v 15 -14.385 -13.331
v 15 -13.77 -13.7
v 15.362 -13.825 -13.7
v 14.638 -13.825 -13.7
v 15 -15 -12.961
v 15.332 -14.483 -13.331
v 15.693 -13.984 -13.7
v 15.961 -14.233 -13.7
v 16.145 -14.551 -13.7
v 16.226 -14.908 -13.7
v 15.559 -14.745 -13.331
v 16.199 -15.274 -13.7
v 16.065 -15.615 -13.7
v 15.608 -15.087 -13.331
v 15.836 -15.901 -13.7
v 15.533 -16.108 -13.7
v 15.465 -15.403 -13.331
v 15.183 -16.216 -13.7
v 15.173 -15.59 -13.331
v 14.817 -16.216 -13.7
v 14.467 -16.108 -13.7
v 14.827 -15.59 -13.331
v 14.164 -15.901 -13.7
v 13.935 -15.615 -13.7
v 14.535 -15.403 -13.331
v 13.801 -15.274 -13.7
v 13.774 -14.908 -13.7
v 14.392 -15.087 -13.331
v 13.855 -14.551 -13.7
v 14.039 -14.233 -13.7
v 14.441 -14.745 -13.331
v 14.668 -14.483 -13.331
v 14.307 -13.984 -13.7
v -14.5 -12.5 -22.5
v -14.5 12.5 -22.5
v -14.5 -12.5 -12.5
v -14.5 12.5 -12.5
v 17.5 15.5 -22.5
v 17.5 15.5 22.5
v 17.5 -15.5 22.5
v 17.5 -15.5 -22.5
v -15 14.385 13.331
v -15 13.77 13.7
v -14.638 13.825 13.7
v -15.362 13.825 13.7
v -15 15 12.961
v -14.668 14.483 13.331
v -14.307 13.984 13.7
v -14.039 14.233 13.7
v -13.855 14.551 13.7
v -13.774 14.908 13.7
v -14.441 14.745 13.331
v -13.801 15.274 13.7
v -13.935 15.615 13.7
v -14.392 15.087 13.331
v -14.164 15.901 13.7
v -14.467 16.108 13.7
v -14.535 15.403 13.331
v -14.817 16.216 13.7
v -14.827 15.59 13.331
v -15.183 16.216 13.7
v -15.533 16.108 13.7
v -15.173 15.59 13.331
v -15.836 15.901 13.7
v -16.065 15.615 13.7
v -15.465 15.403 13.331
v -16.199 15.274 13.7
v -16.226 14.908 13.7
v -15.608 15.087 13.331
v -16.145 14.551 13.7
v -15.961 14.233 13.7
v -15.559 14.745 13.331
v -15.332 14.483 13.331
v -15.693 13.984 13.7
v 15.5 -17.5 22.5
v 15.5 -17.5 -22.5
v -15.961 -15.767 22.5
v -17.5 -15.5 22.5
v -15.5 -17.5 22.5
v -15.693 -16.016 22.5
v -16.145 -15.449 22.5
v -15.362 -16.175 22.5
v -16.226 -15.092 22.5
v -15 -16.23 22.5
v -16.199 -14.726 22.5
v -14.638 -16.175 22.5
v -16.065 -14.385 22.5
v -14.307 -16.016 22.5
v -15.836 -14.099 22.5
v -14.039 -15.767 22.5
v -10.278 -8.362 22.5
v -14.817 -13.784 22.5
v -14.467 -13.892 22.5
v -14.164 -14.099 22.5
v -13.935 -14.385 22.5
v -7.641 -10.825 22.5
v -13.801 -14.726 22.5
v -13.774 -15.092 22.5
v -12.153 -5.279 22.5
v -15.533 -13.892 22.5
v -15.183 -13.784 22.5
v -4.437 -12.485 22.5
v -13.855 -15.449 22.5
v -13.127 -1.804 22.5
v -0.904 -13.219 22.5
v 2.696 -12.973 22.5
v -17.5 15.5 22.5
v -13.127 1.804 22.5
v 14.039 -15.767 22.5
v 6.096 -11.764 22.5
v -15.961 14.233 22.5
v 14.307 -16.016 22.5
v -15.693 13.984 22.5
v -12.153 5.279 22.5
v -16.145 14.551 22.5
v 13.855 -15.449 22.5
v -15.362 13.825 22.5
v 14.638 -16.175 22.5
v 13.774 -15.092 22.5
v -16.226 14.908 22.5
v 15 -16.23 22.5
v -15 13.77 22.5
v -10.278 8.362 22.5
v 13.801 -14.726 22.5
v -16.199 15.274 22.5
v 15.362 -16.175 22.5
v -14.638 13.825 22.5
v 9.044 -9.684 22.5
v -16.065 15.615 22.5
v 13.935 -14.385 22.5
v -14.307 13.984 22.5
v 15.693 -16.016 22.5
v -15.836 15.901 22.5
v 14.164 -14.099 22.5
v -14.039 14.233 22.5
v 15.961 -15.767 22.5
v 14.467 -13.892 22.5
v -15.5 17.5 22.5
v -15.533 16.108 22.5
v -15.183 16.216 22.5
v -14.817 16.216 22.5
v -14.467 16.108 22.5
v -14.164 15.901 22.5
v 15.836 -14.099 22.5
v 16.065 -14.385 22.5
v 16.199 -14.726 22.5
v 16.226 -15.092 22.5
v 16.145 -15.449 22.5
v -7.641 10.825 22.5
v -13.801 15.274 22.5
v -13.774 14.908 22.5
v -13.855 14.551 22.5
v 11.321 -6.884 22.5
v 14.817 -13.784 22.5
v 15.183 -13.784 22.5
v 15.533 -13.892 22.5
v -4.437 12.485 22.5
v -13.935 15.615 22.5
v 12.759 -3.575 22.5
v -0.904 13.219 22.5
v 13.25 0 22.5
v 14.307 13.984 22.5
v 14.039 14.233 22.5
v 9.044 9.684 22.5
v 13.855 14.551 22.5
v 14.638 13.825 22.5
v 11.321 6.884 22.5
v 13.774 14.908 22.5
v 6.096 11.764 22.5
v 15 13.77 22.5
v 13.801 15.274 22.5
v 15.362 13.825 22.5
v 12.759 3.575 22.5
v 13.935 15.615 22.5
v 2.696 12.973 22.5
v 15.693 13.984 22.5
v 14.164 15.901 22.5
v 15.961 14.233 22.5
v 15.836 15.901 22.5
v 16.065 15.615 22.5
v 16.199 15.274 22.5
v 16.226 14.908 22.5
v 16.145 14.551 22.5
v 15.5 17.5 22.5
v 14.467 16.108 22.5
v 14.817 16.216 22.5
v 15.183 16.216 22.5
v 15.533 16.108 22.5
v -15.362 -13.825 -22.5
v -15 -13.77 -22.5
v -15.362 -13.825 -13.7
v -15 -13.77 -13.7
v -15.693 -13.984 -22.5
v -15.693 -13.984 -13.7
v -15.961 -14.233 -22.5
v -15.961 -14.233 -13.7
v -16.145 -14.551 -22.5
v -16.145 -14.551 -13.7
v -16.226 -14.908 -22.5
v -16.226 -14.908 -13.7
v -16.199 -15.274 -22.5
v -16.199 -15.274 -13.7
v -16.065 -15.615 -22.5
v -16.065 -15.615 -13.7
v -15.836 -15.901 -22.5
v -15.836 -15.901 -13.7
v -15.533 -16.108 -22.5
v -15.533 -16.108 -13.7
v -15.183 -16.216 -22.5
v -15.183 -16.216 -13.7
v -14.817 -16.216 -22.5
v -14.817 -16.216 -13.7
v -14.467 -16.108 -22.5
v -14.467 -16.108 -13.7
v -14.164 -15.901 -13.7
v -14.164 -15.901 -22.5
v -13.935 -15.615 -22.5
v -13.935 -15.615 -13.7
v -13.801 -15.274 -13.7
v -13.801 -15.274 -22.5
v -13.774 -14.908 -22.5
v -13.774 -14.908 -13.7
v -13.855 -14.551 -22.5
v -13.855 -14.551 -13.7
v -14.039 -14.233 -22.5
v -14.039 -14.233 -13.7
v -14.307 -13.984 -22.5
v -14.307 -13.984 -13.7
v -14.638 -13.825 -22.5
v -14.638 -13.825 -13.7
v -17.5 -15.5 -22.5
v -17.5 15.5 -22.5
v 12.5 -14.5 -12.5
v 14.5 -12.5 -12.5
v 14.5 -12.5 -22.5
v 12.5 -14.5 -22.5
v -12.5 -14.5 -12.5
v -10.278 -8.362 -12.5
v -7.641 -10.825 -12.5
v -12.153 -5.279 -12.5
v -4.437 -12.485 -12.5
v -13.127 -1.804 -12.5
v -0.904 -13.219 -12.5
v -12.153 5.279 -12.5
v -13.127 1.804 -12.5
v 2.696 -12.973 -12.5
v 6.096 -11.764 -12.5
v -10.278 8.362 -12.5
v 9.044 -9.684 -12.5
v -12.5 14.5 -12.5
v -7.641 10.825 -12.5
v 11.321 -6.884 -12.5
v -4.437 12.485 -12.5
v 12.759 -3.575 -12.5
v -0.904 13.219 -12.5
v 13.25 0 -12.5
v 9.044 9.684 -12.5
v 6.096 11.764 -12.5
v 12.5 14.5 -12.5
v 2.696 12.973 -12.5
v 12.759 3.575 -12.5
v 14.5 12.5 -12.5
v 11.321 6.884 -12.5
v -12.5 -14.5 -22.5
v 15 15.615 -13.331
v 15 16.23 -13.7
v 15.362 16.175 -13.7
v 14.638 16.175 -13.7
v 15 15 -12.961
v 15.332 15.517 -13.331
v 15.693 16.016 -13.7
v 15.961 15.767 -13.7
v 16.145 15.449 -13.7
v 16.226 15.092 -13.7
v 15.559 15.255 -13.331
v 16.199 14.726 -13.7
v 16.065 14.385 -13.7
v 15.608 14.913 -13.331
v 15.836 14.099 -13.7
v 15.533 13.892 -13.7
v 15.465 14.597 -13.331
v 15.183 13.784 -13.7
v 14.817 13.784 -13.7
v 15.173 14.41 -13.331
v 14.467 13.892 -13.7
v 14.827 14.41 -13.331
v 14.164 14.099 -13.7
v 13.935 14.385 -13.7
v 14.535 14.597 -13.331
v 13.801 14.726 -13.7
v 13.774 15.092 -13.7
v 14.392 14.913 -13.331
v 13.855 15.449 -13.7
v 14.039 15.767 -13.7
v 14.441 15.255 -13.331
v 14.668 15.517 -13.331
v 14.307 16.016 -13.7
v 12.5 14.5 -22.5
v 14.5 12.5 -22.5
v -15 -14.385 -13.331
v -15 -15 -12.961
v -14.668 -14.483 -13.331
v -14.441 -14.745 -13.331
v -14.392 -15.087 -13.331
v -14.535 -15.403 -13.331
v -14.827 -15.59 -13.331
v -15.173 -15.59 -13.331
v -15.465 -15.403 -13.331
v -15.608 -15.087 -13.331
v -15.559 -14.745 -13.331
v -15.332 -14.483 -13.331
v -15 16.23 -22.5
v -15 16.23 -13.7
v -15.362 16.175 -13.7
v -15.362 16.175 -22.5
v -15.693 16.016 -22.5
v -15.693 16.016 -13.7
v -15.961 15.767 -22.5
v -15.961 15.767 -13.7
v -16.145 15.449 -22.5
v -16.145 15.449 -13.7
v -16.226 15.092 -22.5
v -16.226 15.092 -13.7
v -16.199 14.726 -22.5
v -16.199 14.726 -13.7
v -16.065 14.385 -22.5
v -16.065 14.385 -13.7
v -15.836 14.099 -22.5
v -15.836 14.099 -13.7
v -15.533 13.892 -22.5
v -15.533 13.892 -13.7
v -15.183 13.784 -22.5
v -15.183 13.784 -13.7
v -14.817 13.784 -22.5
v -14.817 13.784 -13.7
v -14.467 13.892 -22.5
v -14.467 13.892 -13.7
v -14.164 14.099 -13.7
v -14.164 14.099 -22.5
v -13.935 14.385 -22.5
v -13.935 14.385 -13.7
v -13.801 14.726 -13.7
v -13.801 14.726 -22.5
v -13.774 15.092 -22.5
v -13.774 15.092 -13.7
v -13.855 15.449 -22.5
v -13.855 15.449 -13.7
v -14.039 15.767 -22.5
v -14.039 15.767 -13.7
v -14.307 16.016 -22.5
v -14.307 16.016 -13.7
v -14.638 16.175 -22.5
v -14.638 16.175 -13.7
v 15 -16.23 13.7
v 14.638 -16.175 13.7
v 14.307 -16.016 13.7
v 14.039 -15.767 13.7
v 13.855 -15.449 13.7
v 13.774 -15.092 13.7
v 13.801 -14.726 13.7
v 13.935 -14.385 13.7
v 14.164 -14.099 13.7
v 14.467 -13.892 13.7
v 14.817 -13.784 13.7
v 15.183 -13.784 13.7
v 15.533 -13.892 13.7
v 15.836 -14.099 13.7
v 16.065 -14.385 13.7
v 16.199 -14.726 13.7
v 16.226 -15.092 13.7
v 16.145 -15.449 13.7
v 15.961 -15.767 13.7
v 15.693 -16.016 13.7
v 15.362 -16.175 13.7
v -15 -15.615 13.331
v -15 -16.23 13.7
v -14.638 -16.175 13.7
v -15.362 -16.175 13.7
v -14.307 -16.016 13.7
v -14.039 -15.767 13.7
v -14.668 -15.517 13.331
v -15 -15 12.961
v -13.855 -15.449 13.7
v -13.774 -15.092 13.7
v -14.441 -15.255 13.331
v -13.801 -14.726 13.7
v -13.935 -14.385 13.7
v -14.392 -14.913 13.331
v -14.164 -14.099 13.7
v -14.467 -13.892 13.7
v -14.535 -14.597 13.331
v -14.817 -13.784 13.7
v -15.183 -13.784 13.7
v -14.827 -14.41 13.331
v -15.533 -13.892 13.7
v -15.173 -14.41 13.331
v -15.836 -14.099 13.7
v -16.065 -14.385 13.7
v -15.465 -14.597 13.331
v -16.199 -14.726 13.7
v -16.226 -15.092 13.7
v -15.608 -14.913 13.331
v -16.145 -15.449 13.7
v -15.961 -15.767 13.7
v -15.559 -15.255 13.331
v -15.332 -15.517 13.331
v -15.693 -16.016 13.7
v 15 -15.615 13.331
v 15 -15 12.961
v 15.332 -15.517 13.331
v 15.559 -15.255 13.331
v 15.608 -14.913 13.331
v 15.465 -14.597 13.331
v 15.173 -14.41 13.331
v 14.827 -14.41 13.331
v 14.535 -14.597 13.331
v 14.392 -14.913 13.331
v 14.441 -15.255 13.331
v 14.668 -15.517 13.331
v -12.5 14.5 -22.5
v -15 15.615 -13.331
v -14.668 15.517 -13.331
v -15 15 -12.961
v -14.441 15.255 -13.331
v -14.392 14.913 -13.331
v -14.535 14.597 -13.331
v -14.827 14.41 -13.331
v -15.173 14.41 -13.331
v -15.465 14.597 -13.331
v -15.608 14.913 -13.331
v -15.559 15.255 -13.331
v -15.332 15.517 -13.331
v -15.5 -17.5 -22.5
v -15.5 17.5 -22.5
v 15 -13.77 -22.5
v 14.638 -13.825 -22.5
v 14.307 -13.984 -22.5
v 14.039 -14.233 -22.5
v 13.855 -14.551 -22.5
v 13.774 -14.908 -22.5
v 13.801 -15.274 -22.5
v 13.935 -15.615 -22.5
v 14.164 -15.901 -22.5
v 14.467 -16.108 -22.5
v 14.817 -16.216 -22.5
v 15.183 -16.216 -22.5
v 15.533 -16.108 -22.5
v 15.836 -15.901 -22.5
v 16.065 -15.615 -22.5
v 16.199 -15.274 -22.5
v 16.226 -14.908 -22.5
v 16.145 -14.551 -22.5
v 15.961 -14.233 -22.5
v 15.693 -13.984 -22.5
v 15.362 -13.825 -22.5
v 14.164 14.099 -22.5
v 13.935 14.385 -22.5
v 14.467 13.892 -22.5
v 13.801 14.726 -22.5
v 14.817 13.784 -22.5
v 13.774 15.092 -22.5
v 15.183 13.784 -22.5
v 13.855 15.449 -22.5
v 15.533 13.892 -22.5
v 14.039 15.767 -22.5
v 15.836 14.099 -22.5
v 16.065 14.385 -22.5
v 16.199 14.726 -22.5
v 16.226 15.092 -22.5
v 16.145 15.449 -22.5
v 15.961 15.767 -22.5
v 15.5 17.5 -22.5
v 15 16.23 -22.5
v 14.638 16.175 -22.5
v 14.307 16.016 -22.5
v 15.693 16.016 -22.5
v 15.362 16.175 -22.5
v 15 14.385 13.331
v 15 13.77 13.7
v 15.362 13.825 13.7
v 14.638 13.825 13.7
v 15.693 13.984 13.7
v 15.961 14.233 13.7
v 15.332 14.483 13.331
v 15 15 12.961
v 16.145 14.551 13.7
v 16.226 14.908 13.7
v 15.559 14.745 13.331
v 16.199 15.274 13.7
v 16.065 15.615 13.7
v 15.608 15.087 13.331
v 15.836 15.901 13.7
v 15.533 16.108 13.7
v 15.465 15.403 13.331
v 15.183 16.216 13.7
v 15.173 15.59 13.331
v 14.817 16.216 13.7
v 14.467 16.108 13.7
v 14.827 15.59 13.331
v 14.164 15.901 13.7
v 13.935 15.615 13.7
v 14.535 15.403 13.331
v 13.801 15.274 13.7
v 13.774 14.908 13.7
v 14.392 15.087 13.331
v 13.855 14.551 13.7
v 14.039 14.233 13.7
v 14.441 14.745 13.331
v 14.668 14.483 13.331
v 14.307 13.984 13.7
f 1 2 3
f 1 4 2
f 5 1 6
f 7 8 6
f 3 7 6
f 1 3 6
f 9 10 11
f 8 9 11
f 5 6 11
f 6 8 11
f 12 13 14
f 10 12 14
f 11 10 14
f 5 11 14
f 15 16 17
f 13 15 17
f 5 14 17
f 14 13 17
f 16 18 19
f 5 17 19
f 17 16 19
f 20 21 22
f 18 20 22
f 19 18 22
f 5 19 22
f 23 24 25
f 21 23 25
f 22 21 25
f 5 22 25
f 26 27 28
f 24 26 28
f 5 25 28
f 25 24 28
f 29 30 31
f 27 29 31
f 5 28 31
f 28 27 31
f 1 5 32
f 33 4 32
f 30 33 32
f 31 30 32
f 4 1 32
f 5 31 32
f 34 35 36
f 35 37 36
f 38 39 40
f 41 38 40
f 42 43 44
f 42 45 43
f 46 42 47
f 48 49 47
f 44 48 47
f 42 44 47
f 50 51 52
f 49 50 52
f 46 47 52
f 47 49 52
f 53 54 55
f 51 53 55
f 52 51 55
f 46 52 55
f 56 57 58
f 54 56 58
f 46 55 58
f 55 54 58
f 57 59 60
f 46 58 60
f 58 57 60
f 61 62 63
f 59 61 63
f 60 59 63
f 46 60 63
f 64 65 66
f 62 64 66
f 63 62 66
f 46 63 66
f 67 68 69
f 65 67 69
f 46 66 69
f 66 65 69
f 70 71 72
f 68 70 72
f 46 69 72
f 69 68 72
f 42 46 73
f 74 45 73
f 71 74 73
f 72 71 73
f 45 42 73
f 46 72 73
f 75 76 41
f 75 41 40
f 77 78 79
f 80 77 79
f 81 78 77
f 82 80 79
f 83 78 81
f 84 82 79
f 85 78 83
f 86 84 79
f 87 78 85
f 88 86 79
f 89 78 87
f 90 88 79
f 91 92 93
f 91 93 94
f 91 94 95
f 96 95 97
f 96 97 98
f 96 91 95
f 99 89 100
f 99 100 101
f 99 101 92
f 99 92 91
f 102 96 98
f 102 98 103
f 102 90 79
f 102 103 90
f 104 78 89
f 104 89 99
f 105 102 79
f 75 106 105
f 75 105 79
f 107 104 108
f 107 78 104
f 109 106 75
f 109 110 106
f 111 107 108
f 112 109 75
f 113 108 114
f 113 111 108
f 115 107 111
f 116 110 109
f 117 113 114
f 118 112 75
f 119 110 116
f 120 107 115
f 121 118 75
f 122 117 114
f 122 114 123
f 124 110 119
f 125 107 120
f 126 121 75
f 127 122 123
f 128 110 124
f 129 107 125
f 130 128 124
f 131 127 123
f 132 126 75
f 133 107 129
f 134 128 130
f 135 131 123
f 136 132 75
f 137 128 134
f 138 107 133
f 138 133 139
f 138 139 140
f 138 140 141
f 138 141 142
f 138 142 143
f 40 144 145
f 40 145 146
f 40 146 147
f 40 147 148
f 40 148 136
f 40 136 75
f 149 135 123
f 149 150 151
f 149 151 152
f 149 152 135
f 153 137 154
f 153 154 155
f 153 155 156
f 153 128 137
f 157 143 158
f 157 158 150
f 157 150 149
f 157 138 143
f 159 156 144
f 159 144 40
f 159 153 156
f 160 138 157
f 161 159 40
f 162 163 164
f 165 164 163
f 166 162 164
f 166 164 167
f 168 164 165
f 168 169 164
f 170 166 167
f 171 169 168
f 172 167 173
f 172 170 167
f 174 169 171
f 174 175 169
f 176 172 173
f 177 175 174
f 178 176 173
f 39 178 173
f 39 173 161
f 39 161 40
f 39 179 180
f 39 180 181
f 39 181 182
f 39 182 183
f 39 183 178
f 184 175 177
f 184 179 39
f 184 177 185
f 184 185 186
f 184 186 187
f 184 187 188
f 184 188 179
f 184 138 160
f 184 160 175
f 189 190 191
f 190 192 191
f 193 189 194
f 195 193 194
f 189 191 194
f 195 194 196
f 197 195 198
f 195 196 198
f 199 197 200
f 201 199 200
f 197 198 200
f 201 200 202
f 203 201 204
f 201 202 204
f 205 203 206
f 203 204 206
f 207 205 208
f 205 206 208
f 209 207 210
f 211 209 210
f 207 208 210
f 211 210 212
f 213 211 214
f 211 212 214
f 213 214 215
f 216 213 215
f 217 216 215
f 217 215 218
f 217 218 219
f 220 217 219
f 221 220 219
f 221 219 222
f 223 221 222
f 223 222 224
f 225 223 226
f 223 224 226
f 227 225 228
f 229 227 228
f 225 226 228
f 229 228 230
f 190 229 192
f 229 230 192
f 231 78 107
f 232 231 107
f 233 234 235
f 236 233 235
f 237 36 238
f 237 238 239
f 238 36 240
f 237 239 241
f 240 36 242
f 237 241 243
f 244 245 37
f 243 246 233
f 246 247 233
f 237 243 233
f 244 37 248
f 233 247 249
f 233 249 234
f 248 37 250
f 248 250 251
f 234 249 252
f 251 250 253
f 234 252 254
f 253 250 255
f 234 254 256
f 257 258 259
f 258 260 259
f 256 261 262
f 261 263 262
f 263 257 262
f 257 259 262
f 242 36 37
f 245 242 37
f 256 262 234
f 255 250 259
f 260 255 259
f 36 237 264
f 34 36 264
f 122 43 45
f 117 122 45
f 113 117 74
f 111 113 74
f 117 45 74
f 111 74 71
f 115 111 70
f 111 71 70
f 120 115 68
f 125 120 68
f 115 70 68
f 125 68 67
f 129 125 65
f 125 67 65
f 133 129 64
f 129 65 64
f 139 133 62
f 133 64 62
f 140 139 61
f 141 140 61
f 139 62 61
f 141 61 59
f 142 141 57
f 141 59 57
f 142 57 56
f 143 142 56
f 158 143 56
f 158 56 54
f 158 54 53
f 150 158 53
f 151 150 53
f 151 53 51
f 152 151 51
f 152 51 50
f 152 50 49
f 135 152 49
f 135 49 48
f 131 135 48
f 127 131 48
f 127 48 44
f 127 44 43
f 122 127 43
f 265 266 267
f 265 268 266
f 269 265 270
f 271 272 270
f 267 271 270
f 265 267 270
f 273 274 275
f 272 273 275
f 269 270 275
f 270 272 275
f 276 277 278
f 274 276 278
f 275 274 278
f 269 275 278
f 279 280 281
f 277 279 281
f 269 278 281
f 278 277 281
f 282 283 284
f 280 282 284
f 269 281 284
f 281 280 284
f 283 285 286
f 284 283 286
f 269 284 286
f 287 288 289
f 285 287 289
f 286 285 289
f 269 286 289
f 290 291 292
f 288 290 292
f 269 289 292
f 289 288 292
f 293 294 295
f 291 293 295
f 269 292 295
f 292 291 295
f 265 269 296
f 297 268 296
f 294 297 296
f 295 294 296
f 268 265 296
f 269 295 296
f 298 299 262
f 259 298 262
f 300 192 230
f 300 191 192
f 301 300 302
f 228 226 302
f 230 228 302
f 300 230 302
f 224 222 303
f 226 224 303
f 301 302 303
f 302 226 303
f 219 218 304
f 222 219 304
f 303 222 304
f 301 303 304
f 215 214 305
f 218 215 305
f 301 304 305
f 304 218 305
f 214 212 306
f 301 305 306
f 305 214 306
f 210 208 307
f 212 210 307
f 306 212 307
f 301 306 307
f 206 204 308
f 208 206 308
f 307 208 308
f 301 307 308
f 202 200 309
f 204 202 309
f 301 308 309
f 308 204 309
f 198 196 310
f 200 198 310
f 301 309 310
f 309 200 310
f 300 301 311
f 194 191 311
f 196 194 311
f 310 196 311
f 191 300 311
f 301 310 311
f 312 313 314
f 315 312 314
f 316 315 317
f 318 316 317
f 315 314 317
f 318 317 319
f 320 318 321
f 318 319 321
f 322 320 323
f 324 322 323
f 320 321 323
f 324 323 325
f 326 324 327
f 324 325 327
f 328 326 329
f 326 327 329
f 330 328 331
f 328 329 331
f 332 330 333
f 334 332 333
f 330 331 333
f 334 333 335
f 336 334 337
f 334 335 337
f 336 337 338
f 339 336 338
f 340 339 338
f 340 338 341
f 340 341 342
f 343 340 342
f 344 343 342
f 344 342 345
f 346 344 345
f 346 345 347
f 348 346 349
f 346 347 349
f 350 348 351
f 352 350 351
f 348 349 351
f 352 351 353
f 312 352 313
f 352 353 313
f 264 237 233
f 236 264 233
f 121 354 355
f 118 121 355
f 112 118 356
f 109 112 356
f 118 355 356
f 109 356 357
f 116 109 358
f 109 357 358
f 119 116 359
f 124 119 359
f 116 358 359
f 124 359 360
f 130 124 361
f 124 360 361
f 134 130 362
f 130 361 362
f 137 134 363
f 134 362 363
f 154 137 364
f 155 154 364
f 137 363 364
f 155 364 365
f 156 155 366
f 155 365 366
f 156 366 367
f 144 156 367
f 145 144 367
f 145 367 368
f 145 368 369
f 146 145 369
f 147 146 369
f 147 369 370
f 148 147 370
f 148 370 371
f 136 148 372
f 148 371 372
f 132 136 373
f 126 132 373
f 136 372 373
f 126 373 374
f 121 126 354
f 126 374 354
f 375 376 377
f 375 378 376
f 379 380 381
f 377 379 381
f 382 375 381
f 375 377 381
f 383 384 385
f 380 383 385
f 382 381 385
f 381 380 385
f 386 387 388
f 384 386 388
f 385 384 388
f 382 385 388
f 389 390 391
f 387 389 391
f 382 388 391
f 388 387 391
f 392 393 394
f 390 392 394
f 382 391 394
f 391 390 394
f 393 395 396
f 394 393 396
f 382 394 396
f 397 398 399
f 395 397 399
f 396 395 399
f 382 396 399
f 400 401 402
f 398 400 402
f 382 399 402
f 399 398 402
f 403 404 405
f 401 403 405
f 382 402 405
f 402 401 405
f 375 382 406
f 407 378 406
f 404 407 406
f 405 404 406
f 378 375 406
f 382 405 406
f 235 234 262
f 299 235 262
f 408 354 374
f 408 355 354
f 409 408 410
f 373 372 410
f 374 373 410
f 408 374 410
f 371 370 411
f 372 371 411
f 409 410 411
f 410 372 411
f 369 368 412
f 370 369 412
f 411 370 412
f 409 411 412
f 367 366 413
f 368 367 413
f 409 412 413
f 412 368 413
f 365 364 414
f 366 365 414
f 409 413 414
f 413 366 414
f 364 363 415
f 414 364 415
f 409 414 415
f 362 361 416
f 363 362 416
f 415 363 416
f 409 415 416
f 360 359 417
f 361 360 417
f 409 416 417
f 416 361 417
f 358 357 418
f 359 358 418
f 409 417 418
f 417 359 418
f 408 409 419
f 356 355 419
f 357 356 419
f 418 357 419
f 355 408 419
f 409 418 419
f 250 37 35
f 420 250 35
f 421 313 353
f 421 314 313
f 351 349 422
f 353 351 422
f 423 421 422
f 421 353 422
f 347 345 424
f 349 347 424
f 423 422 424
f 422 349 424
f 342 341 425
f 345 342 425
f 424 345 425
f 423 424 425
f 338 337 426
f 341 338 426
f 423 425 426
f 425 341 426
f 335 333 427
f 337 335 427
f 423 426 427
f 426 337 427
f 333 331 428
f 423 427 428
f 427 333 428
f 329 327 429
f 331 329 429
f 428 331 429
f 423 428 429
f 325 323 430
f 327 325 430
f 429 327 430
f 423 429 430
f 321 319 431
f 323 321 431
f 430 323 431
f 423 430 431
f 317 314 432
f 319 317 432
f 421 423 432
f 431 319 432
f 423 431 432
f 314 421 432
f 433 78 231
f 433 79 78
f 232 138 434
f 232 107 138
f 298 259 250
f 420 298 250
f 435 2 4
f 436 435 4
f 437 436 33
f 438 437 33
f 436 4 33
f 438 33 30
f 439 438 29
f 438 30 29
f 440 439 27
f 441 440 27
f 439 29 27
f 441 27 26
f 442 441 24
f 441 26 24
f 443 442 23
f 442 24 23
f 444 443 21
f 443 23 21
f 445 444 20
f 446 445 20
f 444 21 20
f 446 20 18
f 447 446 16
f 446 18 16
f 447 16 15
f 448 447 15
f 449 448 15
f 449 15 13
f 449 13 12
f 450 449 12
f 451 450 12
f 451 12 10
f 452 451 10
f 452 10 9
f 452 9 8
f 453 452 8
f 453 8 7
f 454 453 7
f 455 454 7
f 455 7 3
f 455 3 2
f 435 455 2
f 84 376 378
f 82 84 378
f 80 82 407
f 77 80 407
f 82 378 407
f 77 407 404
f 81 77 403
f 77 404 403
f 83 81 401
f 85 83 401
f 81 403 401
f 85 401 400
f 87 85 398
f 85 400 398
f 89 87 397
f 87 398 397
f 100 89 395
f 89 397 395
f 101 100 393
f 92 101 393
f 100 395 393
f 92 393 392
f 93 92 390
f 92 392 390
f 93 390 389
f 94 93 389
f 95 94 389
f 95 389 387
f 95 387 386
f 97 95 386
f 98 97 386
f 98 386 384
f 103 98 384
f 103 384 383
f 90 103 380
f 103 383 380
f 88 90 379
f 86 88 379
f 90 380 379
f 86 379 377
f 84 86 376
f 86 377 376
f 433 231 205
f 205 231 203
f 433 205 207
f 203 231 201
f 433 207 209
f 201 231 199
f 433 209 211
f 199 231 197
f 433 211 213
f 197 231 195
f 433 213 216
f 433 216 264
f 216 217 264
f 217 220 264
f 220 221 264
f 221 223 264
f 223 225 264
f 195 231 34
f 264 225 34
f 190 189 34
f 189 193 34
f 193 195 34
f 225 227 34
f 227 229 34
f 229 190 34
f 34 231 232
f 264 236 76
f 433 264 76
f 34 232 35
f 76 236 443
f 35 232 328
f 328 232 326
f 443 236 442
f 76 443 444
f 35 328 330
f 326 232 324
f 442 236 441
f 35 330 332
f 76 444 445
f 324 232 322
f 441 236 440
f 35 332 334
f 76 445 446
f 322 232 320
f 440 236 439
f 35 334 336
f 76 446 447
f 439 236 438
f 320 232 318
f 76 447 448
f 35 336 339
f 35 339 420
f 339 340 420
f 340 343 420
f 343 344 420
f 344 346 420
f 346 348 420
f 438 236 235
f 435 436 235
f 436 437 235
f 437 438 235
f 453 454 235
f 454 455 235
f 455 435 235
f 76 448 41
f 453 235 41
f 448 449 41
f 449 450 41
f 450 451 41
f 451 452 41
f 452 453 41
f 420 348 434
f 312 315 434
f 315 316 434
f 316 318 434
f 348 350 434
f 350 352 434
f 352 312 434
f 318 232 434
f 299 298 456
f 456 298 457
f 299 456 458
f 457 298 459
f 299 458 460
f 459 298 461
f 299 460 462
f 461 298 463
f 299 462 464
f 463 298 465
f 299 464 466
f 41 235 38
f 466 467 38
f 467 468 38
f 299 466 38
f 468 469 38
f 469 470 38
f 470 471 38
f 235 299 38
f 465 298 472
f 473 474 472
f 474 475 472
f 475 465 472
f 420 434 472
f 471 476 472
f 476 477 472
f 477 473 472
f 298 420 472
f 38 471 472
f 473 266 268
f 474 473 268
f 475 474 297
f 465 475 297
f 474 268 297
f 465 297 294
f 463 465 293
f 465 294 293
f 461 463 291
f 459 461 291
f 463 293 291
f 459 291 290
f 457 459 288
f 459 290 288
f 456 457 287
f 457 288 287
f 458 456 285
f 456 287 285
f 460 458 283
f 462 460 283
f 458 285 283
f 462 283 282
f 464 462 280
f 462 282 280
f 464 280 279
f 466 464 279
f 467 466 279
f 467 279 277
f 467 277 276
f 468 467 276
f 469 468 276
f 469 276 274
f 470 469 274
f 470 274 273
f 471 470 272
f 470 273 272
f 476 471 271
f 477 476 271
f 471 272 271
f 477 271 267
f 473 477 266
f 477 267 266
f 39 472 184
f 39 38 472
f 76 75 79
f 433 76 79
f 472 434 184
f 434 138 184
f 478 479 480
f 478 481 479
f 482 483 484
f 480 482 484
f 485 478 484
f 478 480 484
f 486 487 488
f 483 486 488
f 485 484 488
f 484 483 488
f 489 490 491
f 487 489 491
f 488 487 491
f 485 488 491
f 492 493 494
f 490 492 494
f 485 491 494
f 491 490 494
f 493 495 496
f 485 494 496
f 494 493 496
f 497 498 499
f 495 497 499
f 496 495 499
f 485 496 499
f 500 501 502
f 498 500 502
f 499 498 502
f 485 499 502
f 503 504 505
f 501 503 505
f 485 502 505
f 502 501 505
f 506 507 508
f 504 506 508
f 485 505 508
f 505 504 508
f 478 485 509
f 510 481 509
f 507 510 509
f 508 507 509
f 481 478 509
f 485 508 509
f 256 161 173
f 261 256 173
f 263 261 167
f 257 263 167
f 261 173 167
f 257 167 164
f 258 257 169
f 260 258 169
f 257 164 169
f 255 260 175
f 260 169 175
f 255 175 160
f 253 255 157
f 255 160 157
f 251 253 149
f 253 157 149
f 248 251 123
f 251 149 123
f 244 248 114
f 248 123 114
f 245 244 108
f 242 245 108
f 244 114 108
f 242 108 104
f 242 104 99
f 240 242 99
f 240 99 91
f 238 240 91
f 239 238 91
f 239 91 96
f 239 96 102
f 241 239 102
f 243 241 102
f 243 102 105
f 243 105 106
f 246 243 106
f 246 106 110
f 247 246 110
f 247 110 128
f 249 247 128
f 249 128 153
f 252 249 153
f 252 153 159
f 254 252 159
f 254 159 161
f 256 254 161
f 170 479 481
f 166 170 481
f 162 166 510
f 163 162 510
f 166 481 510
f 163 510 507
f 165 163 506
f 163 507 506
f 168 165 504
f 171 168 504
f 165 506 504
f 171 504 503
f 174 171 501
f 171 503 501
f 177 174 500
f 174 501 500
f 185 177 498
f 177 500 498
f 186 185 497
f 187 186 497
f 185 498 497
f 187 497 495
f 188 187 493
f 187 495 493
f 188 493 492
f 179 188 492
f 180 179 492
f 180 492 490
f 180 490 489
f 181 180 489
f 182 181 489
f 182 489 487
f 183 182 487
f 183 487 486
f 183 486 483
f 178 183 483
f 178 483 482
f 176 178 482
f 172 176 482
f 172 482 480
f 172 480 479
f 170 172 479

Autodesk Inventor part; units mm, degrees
ref_plane "YZ Plane" through (0, 0, 0) normal (1, 0, 0) x (0, 1, 0)
ref_plane "XZ Plane" through (0, 0, 0) normal (0, 1, 0) x (-1, 0, 0)
ref_plane "XY Plane" through (0, 0, 0) normal (0, 0, 1) x (1, 0, 0)
sketch "Sketch1" plane through (0, 0, 0) normal (0, 0, 1) x (1, 0, 0)
  line L0 (-17.5, 17.5) -> (17.5, 17.5)
  line L1 (17.5, 17.5) -> (17.5, -17.5)
  line L2 (17.5, -17.5) -> (-17.5, -17.5)
  line L3 (-17.5, -17.5) -> (-17.5, 17.5)
  line L4 (14.5, 14.5) -> (-14.5, 14.5)
  line L5 (-14.5, 14.5) -> (-14.5, -14.5)
  line L6 (-14.5, -14.5) -> (14.5, -14.5)
  line L7 (14.5, -14.5) -> (14.5, 14.5)
  point P0 (0, 0)
  point P1 (17.5, 0)
  point P2 (0, 17.5)
  dimension "d0" = 35
  dimension "d1" = 35
  dimension "d2" = 3
extrude "Extrusion1" add sketch "Sketch1" against normal mid plane 45
chamfer "Chamfer1" distance 2 angle 45 8 edges at (-17.5, 17.5, 0) (17.5, 17.5, 0) (-14.5, 14.5, 0) (14.5, 14.5, 0) (-14.5, -14.5, 0) (14.5, -14.5, 0) (17.5, -17.5, 0) (-17.5, -17.5, 0)
sketch "Sketch2" plane through (0, 0, 22.5) normal (0, 0, 1) x (1, 0, 0)
  line L0 (15.5, 17.5) -> (-15.5, 17.5) projected
  line L1 (-12.5, 14.5) -> (12.5, 14.5) projected
  line L2 (-17.5, 15.5) -> (-15.5, 17.5) projected
  line L3 (-12.5, 14.5) -> (-14.5, 12.5) projected
  line L4 (14.5, 12.5) -> (12.5, 14.5) projected
  line L5 (15.5, 17.5) -> (17.5, 15.5) projected
  line L6 (-17.5, 15.5) -> (-17.5, -15.5) projected
  line L7 (-14.5, -12.5) -> (-14.5, 12.5) projected
  line L8 (-14.5, -12.5) -> (-12.5, -14.5) projected
  line L9 (-15.5, -17.5) -> (15.5, -17.5) projected
  line L10 (17.5, -15.5) -> (17.5, 15.5) projected
  line L11 (-15.5, -17.5) -> (-17.5, -15.5) projected
  line L12 (12.5, -14.5) -> (-12.5, -14.5) projected
  point P0 (0, 0)
  point P1 (-15, 15)
  point P2 (15, 15)
  point P3 (15, -15)
  point P4 (-15, -17.5)
  point P5 (-15, -15)
  point P6 (15, -17.5)
  dimension "d8" = 3
  dimension "d9" = 4.2426
  dimension "d10" = 2.1213
  dimension "d11" = 5
  dimension "d12" = 2.5
  dimension "d13" = 2.5
  dimension "d14" = 4.2426
  dimension "d15" = 2.1213
  dimension "d26" = 5
  dimension "d27" = 2.5
  dimension "d28" = 5
  dimension "d29" = 2.5
  dimension "d30" = 2.5
  dimension "d31" = 2.5
  dimension "d64" = 4.2426
hole "Hole1" at (-15, 15, 22.5) at (15, 15, 22.5) at (15, -15, 22.5) at (-15, -15, 22.5) direction (0, 0, -1) diameter 2.459 depth 8.8 tip angle 118 thread size "M3x0.5" class "6H" standard "ISO Metric profile"
sketch "Sketch4" plane through (0, 0, -22.5) normal (0, 0, -1) x (-1, 0, 0)
  line L0 (15.5, 17.5) -> (-15.5, 17.5)
  line L1 (-12.5, 14.5) -> (12.5, 14.5)
  line L2 (-17.5, 15.5) -> (-15.5, 17.5)
  line L3 (-12.5, 14.5) -> (-14.5, 12.5)
  line L4 (14.5, 12.5) -> (12.5, 14.5)
  line L5 (15.5, 17.5) -> (17.5, 15.5)
  line L6 (-17.5, 15.5) -> (-17.5, -17.5)
  line L7 (-14.5, -12.5) -> (-14.5, 12.5)
  line L8 (-14.5, -12.5) -> (-12.5, -14.5)
  line L9 (-17.5, -17.5) -> (17.5, -17.5)
  line L10 (17.5, -17.5) -> (17.5, 15.5)
  line L11 (-17.5, 15.5) -> (-15.5, 17.5) projected
  line L12 (-17.5, 15.5) -> (-17.5, -15.5) projected
  line L13 (-15.5, -17.5) -> (15.5, -17.5) projected
  line L14 (17.5, -15.5) -> (17.5, 15.5) projected
  line L15 (15.5, 17.5) -> (17.5, 15.5) projected
  line L16 (15.5, 17.5) -> (-15.5, 17.5) projected
  line L17 (-14.5, -12.5) -> (-14.5, 12.5) projected
  line L18 (-12.5, 14.5) -> (-14.5, 12.5) projected
  line L19 (-12.5, 14.5) -> (12.5, 14.5) projected
  line L20 (14.5, 12.5) -> (12.5, 14.5) projected
  line L21 (14.5, 12.5) -> (14.5, -12.5) projected
  line L22 (12.5, -14.5) -> (14.5, -12.5) projected
  line L23 (12.5, -14.5) -> (-12.5, -14.5) projected
  line L24 (-14.5, -12.5) -> (-12.5, -14.5) projected
  line L25 (17.5, -15.5) -> (15.5, -17.5) projected
  line L26 (-15.5, -17.5) -> (-17.5, -15.5) projected
  point P0 (0, 0)
  point P1 (0, 0)
  point P2 (-15, 15)
  point P3 (15, 15)
  point P4 (15, -15)
  point P5 (-15, -15)
  dimension "d39" = 3
  dimension "d40" = 4.2426
  dimension "d41" = 2.1213
  dimension "d42" = 5
  dimension "d43" = 2.5
  dimension "d44" = 2.5
  dimension "d45" = 4.2426
  dimension "d46" = 2.1213
  dimension "d47" = 5.6569
  dimension "d48" = 5
  dimension "d49" = 2.5
  dimension "d50" = 5
  dimension "d51" = 2.5
  dimension "d52" = 2.5
  dimension "d53" = 2.5
hole "Hole2" at (15, 15, -22.5) at (-15, 15, -22.5) at (-15, -15, -22.5) at (15, -15, -22.5) direction (0, 0, 1) diameter 2.459 depth 8.8 tip angle 118 thread size "M3x0.5" class "6H" standard "ISO Metric profile"
sketch "Sketch7" plane through (0, 0, 22.5) normal (0, 0, 1) x (1, 0, 0)
  circle A0 centre (0, 0) radius 13.25
  circle A1 centre (15, -15) radius 1.2295 projected
  circle A2 centre (-15, 15) radius 1.2295 projected
  circle A3 centre (15, 15) radius 1.2295 projected
  circle A4 centre (-15, -15) radius 1.2295 projected
  line L0 (15.5, 17.5) -> (17.5, 15.5) projected
  line L1 (15.5, 17.5) -> (-15.5, 17.5) projected
  line L2 (-17.5, 15.5) -> (-15.5, 17.5) projected
  line L3 (-17.5, 15.5) -> (-17.5, -15.5) projected
  line L4 (-15.5, -17.5) -> (15.5, -17.5) projected
  line L5 (17.5, -15.5) -> (17.5, 15.5) projected
  line L6 (14.5, 12.5) -> (14.5, -12.5) projected
  line L7 (12.5, -14.5) -> (14.5, -12.5) projected
  line L8 (12.5, -14.5) -> (-12.5, -14.5) projected
  line L9 (-14.5, -12.5) -> (-12.5, -14.5) projected
  line L10 (-14.5, -12.5) -> (-14.5, 12.5) projected
  line L11 (-12.5, 14.5) -> (-14.5, 12.5) projected
  line L12 (-12.5, 14.5) -> (12.5, 14.5) projected
  line L13 (14.5, 12.5) -> (12.5, 14.5) projected
  line L14 (-15.5, -17.5) -> (-17.5, -15.5) projected
  line L15 (17.5, -15.5) -> (15.5, -17.5) projected
  dimension "d61" = 26.5
extrude "Extrusion2" add sketch "Sketch7" against normal blind 35 contours L6 L7 L8 L9 L10 L11 L12 L13
equation "\"d10\" = 0.5 * d9"
equation "\"d12\" = 0.5 * d11"
equation "\"d13\" = d12"
equation "\"d15\" = d10"
equation "\"d27\" = 0.5 * d26"
equation "\"d29\" = 0.5 * d28"
equation "\"d30\" = d29"
equation "\"d31\" = d27"
equation "\"d41\" = 0.5 * d40"
equation "\"d43\" = 0.5 * d42"
equation "\"d44\" = d43"
equation "\"d46\" = d41"
equation "\"d49\" = 0.5 * d48"
equation "\"d51\" = 0.5 * d50"
equation "\"d52\" = d51"
equation "\"d53\" = d49"
properties part number "Cover for servo motor 250 W" material "Stainless Steel"
